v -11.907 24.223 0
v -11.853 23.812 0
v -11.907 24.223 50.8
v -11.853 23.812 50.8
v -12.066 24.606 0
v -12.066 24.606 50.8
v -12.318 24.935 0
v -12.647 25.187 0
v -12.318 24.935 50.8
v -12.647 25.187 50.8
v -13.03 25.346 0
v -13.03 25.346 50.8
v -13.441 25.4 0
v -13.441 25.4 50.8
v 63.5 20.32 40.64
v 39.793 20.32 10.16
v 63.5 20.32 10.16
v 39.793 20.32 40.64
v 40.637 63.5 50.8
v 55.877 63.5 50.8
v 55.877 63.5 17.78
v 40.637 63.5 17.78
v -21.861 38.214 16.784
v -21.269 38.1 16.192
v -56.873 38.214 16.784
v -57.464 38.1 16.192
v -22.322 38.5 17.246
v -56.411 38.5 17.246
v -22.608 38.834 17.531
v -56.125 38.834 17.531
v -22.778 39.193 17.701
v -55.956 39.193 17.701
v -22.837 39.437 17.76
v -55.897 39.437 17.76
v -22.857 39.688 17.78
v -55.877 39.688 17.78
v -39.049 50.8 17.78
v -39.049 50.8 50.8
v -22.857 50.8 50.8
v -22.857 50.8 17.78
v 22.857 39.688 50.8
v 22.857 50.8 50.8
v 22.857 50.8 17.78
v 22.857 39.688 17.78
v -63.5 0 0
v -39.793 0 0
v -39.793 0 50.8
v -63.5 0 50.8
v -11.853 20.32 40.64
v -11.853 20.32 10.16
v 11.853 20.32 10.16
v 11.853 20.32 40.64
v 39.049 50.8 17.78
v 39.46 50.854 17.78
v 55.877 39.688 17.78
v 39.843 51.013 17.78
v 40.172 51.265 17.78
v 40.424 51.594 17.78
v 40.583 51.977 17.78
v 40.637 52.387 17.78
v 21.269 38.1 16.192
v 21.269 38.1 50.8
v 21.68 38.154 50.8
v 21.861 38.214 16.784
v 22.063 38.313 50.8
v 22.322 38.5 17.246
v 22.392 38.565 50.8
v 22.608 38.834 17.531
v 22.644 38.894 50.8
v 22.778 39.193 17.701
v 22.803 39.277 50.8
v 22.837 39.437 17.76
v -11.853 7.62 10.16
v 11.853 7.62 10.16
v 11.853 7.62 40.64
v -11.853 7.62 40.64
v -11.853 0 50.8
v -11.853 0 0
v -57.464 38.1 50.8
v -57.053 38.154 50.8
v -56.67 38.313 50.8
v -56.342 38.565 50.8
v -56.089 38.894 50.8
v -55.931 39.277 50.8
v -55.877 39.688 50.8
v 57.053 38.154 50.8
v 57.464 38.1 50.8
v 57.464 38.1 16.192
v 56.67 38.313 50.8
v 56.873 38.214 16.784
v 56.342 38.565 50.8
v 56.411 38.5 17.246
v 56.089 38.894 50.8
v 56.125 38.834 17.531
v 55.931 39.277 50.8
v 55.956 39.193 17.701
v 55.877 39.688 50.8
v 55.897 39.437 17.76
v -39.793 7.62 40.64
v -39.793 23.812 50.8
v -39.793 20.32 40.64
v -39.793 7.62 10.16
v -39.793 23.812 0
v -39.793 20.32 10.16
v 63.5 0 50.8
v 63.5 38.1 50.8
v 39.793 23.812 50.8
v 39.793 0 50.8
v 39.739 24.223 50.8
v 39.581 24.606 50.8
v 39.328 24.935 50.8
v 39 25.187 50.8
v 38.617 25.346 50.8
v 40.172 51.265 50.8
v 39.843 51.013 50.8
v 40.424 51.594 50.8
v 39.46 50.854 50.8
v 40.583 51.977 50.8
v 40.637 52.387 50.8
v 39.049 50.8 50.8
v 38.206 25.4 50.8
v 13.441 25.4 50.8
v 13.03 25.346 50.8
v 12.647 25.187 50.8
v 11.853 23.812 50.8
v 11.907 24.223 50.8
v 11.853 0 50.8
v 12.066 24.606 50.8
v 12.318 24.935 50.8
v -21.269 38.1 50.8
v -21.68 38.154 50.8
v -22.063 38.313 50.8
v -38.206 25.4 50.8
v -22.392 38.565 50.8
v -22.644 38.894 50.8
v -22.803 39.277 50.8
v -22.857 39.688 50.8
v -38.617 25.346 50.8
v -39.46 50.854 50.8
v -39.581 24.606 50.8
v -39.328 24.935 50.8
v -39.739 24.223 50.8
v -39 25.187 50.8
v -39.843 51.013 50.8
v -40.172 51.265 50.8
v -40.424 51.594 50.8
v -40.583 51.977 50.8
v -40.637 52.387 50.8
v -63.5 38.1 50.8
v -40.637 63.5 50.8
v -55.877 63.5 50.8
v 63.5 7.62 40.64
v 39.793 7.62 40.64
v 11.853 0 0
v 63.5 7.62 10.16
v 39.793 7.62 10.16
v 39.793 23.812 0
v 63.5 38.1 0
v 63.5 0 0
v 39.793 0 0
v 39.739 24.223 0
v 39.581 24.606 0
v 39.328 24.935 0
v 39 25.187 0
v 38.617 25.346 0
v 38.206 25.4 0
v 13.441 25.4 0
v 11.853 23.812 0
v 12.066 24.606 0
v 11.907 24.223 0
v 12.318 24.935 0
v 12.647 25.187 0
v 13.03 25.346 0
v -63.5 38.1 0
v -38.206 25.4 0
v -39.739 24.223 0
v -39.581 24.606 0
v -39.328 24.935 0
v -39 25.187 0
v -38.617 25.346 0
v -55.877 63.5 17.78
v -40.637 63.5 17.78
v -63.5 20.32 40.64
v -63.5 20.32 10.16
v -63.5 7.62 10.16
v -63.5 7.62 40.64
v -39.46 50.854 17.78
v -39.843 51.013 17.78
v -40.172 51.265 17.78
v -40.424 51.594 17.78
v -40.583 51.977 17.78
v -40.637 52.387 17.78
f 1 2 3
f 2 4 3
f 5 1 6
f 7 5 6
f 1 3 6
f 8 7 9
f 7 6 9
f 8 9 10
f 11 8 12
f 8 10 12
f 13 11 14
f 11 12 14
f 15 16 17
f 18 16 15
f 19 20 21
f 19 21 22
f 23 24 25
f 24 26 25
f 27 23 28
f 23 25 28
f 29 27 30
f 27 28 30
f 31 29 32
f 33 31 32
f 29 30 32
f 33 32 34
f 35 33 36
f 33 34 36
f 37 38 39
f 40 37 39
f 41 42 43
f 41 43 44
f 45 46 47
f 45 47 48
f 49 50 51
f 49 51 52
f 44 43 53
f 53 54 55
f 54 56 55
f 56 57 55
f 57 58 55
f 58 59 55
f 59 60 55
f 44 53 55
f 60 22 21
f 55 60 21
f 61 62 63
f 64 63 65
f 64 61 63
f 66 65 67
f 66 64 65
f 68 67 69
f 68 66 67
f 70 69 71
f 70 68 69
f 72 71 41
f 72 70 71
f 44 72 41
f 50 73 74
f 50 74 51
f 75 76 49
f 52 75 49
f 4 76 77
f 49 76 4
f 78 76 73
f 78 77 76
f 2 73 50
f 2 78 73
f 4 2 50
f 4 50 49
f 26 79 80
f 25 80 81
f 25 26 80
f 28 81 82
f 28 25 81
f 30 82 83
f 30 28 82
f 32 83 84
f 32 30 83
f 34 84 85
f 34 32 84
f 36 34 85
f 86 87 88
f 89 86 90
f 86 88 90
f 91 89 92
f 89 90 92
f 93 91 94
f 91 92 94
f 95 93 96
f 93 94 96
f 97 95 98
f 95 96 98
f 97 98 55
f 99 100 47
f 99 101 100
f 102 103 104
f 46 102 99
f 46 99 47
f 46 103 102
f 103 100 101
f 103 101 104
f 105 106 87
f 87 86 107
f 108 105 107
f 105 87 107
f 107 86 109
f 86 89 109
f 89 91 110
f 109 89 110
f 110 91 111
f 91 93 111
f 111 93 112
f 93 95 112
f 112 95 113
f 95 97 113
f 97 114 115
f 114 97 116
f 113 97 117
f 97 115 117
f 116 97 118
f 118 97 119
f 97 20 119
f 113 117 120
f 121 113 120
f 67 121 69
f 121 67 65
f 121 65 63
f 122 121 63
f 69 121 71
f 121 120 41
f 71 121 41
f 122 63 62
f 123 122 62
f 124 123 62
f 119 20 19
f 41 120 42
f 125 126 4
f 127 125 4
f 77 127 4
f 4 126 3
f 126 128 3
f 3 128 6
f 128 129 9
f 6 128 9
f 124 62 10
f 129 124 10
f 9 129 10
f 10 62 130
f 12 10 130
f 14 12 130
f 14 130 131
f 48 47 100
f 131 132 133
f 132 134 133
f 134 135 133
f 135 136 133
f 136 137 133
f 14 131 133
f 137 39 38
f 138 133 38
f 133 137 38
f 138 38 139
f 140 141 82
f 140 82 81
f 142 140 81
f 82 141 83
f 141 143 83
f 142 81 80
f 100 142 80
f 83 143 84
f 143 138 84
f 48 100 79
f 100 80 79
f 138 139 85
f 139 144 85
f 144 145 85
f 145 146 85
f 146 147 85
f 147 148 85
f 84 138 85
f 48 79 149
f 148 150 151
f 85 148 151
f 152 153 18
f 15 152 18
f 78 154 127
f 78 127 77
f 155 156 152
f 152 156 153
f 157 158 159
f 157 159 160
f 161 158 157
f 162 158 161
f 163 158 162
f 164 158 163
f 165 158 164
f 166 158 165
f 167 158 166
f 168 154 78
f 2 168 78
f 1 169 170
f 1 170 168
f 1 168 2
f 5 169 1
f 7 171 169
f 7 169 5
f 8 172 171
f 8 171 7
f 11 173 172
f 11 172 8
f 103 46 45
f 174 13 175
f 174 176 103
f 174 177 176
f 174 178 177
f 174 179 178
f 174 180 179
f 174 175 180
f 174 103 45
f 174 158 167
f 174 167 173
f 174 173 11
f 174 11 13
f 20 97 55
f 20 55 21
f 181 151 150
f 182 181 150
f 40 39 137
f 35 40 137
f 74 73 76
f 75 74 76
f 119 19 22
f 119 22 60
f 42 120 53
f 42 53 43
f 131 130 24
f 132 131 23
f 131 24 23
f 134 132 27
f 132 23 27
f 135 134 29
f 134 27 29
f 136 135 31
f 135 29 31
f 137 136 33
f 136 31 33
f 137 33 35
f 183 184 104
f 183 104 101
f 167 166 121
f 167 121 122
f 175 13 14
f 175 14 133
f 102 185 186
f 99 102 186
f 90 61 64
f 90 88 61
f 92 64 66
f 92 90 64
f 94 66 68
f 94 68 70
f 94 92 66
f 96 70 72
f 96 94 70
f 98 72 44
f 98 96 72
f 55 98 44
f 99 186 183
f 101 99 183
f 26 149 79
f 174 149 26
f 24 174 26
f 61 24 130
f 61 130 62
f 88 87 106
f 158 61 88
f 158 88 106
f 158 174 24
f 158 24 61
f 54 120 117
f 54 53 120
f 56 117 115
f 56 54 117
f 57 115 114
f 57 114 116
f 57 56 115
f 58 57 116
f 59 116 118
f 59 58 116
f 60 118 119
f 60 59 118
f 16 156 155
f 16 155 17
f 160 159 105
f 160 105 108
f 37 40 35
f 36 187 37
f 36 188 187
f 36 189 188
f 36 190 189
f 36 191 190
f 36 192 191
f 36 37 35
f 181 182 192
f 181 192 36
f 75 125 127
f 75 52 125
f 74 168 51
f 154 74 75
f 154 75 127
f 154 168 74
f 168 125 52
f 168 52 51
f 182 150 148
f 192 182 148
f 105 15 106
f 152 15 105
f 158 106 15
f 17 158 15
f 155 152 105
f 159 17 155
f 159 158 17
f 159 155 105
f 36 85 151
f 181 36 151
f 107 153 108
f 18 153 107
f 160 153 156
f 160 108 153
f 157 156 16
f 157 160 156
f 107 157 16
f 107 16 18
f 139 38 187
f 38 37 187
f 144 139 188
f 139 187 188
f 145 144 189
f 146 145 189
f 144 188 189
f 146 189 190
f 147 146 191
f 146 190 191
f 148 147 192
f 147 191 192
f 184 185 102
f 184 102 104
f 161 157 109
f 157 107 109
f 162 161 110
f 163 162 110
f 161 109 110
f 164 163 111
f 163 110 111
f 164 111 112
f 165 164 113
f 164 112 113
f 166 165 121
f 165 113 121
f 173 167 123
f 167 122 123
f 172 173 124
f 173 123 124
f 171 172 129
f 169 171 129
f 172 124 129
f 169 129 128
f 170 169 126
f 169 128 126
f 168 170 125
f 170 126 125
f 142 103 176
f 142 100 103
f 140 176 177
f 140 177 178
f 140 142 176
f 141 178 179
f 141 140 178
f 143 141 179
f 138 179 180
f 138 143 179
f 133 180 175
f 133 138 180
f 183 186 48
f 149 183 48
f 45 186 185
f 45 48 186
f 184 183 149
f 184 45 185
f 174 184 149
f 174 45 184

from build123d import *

# Parameters (mm, degrees)
BOSS_EXTRUDE1_DEPTH = 50.8
BOSS_EXTRUDE2_DEPTH = 33.02
FILLET2_R           = 1.5875
CUT_EXTRUDE1_REACH  = 152.804
SKETCH3_W           = 30.48
SKETCH3_H           = 12.7


with BuildPart() as part:
    # Sketch1 → Boss-Extrude1 (new body)
    with BuildSketch(Plane.XY):
        Polygon((-63.5, 0), (-63.5, 38.1), (63.5, 38.1), (63.5, 0), (39.793333333, 0), (39.793333333, 25.4), (11.853333333, 25.4), (11.853333333, 0), (-11.853333333, 0), (-11.853333333, 25.4), (-39.793333333, 25.4), (-39.793333333, 0), align=None)
    extrude(amount=BOSS_EXTRUDE1_DEPTH)

    # Sketch2 → Boss-Extrude2 (add)
    with BuildSketch(Plane.XY.offset(50.8)):
        Polygon((55.876679783, 38.1), (55.876679783, 63.5), (40.636679783, 63.5), (40.636679783, 50.8), (22.856679783, 50.8), (22.856679783, 38.1), align=None)
    boss_extrude2 = extrude(amount=-BOSS_EXTRUDE2_DEPTH)

    # Mirror1: Boss-Extrude2 across plane
    add(boss_extrude2.mirror(Plane(origin=(0, 0, 0), x_dir=(0, 0, 1), z_dir=(1, 0, 0))))

    # Fillet2
    fillet2_edges = [part.edges().sort_by_distance(p)[0] for p in [
        (39.793333333, 25.4, 25.4),
        (11.853333333, 25.4, 25.4),
        (-11.853333333, 25.4, 25.4),
        (-39.793333333, 25.4, 25.4),
        (39.366679783, 38.1, 17.78),
        (55.876679783, 38.1, 34.29),
        (22.856679783, 38.1, 34.29),
        (40.636679783, 50.8, 34.29),
        (-22.856679783, 38.1, 34.29),
        (-55.876679783, 38.1, 34.29),
        (-40.636679783, 50.8, 34.29),
        (-39.366679783, 38.1, 17.78),
    ]]
    fillet(fillet2_edges, radius=FILLET2_R)

    # Cut-Extrude1: up to this face of the body (flat: up to its plane)
    cut_extrude1_end = Plane(part.part.faces().sort_by_distance((63.5, 19.05, 25.4))[0])
    # Sketch3 → Cut-Extrude1 (cut, up to the picked face)
    with BuildSketch(Plane.ZY.offset(63.5), mode=Mode.PRIVATE) as cut_extrude1_sk1:
        with Locations((25.4, 13.97)):
            Rectangle(SKETCH3_W, SKETCH3_H)
    cut_extrude1_tool1 = split(extrude(cut_extrude1_sk1.sketch, amount=-CUT_EXTRUDE1_REACH, mode=Mode.PRIVATE), bisect_by=cut_extrude1_end, keep=Keep.BOTH, mode=Mode.PRIVATE)
    add(cut_extrude1_tool1.solids().sort_by(Axis((-63.5, 13.97, 25.4), (1, 0, 0)))[0], mode=Mode.SUBTRACT)


solid = part.part
